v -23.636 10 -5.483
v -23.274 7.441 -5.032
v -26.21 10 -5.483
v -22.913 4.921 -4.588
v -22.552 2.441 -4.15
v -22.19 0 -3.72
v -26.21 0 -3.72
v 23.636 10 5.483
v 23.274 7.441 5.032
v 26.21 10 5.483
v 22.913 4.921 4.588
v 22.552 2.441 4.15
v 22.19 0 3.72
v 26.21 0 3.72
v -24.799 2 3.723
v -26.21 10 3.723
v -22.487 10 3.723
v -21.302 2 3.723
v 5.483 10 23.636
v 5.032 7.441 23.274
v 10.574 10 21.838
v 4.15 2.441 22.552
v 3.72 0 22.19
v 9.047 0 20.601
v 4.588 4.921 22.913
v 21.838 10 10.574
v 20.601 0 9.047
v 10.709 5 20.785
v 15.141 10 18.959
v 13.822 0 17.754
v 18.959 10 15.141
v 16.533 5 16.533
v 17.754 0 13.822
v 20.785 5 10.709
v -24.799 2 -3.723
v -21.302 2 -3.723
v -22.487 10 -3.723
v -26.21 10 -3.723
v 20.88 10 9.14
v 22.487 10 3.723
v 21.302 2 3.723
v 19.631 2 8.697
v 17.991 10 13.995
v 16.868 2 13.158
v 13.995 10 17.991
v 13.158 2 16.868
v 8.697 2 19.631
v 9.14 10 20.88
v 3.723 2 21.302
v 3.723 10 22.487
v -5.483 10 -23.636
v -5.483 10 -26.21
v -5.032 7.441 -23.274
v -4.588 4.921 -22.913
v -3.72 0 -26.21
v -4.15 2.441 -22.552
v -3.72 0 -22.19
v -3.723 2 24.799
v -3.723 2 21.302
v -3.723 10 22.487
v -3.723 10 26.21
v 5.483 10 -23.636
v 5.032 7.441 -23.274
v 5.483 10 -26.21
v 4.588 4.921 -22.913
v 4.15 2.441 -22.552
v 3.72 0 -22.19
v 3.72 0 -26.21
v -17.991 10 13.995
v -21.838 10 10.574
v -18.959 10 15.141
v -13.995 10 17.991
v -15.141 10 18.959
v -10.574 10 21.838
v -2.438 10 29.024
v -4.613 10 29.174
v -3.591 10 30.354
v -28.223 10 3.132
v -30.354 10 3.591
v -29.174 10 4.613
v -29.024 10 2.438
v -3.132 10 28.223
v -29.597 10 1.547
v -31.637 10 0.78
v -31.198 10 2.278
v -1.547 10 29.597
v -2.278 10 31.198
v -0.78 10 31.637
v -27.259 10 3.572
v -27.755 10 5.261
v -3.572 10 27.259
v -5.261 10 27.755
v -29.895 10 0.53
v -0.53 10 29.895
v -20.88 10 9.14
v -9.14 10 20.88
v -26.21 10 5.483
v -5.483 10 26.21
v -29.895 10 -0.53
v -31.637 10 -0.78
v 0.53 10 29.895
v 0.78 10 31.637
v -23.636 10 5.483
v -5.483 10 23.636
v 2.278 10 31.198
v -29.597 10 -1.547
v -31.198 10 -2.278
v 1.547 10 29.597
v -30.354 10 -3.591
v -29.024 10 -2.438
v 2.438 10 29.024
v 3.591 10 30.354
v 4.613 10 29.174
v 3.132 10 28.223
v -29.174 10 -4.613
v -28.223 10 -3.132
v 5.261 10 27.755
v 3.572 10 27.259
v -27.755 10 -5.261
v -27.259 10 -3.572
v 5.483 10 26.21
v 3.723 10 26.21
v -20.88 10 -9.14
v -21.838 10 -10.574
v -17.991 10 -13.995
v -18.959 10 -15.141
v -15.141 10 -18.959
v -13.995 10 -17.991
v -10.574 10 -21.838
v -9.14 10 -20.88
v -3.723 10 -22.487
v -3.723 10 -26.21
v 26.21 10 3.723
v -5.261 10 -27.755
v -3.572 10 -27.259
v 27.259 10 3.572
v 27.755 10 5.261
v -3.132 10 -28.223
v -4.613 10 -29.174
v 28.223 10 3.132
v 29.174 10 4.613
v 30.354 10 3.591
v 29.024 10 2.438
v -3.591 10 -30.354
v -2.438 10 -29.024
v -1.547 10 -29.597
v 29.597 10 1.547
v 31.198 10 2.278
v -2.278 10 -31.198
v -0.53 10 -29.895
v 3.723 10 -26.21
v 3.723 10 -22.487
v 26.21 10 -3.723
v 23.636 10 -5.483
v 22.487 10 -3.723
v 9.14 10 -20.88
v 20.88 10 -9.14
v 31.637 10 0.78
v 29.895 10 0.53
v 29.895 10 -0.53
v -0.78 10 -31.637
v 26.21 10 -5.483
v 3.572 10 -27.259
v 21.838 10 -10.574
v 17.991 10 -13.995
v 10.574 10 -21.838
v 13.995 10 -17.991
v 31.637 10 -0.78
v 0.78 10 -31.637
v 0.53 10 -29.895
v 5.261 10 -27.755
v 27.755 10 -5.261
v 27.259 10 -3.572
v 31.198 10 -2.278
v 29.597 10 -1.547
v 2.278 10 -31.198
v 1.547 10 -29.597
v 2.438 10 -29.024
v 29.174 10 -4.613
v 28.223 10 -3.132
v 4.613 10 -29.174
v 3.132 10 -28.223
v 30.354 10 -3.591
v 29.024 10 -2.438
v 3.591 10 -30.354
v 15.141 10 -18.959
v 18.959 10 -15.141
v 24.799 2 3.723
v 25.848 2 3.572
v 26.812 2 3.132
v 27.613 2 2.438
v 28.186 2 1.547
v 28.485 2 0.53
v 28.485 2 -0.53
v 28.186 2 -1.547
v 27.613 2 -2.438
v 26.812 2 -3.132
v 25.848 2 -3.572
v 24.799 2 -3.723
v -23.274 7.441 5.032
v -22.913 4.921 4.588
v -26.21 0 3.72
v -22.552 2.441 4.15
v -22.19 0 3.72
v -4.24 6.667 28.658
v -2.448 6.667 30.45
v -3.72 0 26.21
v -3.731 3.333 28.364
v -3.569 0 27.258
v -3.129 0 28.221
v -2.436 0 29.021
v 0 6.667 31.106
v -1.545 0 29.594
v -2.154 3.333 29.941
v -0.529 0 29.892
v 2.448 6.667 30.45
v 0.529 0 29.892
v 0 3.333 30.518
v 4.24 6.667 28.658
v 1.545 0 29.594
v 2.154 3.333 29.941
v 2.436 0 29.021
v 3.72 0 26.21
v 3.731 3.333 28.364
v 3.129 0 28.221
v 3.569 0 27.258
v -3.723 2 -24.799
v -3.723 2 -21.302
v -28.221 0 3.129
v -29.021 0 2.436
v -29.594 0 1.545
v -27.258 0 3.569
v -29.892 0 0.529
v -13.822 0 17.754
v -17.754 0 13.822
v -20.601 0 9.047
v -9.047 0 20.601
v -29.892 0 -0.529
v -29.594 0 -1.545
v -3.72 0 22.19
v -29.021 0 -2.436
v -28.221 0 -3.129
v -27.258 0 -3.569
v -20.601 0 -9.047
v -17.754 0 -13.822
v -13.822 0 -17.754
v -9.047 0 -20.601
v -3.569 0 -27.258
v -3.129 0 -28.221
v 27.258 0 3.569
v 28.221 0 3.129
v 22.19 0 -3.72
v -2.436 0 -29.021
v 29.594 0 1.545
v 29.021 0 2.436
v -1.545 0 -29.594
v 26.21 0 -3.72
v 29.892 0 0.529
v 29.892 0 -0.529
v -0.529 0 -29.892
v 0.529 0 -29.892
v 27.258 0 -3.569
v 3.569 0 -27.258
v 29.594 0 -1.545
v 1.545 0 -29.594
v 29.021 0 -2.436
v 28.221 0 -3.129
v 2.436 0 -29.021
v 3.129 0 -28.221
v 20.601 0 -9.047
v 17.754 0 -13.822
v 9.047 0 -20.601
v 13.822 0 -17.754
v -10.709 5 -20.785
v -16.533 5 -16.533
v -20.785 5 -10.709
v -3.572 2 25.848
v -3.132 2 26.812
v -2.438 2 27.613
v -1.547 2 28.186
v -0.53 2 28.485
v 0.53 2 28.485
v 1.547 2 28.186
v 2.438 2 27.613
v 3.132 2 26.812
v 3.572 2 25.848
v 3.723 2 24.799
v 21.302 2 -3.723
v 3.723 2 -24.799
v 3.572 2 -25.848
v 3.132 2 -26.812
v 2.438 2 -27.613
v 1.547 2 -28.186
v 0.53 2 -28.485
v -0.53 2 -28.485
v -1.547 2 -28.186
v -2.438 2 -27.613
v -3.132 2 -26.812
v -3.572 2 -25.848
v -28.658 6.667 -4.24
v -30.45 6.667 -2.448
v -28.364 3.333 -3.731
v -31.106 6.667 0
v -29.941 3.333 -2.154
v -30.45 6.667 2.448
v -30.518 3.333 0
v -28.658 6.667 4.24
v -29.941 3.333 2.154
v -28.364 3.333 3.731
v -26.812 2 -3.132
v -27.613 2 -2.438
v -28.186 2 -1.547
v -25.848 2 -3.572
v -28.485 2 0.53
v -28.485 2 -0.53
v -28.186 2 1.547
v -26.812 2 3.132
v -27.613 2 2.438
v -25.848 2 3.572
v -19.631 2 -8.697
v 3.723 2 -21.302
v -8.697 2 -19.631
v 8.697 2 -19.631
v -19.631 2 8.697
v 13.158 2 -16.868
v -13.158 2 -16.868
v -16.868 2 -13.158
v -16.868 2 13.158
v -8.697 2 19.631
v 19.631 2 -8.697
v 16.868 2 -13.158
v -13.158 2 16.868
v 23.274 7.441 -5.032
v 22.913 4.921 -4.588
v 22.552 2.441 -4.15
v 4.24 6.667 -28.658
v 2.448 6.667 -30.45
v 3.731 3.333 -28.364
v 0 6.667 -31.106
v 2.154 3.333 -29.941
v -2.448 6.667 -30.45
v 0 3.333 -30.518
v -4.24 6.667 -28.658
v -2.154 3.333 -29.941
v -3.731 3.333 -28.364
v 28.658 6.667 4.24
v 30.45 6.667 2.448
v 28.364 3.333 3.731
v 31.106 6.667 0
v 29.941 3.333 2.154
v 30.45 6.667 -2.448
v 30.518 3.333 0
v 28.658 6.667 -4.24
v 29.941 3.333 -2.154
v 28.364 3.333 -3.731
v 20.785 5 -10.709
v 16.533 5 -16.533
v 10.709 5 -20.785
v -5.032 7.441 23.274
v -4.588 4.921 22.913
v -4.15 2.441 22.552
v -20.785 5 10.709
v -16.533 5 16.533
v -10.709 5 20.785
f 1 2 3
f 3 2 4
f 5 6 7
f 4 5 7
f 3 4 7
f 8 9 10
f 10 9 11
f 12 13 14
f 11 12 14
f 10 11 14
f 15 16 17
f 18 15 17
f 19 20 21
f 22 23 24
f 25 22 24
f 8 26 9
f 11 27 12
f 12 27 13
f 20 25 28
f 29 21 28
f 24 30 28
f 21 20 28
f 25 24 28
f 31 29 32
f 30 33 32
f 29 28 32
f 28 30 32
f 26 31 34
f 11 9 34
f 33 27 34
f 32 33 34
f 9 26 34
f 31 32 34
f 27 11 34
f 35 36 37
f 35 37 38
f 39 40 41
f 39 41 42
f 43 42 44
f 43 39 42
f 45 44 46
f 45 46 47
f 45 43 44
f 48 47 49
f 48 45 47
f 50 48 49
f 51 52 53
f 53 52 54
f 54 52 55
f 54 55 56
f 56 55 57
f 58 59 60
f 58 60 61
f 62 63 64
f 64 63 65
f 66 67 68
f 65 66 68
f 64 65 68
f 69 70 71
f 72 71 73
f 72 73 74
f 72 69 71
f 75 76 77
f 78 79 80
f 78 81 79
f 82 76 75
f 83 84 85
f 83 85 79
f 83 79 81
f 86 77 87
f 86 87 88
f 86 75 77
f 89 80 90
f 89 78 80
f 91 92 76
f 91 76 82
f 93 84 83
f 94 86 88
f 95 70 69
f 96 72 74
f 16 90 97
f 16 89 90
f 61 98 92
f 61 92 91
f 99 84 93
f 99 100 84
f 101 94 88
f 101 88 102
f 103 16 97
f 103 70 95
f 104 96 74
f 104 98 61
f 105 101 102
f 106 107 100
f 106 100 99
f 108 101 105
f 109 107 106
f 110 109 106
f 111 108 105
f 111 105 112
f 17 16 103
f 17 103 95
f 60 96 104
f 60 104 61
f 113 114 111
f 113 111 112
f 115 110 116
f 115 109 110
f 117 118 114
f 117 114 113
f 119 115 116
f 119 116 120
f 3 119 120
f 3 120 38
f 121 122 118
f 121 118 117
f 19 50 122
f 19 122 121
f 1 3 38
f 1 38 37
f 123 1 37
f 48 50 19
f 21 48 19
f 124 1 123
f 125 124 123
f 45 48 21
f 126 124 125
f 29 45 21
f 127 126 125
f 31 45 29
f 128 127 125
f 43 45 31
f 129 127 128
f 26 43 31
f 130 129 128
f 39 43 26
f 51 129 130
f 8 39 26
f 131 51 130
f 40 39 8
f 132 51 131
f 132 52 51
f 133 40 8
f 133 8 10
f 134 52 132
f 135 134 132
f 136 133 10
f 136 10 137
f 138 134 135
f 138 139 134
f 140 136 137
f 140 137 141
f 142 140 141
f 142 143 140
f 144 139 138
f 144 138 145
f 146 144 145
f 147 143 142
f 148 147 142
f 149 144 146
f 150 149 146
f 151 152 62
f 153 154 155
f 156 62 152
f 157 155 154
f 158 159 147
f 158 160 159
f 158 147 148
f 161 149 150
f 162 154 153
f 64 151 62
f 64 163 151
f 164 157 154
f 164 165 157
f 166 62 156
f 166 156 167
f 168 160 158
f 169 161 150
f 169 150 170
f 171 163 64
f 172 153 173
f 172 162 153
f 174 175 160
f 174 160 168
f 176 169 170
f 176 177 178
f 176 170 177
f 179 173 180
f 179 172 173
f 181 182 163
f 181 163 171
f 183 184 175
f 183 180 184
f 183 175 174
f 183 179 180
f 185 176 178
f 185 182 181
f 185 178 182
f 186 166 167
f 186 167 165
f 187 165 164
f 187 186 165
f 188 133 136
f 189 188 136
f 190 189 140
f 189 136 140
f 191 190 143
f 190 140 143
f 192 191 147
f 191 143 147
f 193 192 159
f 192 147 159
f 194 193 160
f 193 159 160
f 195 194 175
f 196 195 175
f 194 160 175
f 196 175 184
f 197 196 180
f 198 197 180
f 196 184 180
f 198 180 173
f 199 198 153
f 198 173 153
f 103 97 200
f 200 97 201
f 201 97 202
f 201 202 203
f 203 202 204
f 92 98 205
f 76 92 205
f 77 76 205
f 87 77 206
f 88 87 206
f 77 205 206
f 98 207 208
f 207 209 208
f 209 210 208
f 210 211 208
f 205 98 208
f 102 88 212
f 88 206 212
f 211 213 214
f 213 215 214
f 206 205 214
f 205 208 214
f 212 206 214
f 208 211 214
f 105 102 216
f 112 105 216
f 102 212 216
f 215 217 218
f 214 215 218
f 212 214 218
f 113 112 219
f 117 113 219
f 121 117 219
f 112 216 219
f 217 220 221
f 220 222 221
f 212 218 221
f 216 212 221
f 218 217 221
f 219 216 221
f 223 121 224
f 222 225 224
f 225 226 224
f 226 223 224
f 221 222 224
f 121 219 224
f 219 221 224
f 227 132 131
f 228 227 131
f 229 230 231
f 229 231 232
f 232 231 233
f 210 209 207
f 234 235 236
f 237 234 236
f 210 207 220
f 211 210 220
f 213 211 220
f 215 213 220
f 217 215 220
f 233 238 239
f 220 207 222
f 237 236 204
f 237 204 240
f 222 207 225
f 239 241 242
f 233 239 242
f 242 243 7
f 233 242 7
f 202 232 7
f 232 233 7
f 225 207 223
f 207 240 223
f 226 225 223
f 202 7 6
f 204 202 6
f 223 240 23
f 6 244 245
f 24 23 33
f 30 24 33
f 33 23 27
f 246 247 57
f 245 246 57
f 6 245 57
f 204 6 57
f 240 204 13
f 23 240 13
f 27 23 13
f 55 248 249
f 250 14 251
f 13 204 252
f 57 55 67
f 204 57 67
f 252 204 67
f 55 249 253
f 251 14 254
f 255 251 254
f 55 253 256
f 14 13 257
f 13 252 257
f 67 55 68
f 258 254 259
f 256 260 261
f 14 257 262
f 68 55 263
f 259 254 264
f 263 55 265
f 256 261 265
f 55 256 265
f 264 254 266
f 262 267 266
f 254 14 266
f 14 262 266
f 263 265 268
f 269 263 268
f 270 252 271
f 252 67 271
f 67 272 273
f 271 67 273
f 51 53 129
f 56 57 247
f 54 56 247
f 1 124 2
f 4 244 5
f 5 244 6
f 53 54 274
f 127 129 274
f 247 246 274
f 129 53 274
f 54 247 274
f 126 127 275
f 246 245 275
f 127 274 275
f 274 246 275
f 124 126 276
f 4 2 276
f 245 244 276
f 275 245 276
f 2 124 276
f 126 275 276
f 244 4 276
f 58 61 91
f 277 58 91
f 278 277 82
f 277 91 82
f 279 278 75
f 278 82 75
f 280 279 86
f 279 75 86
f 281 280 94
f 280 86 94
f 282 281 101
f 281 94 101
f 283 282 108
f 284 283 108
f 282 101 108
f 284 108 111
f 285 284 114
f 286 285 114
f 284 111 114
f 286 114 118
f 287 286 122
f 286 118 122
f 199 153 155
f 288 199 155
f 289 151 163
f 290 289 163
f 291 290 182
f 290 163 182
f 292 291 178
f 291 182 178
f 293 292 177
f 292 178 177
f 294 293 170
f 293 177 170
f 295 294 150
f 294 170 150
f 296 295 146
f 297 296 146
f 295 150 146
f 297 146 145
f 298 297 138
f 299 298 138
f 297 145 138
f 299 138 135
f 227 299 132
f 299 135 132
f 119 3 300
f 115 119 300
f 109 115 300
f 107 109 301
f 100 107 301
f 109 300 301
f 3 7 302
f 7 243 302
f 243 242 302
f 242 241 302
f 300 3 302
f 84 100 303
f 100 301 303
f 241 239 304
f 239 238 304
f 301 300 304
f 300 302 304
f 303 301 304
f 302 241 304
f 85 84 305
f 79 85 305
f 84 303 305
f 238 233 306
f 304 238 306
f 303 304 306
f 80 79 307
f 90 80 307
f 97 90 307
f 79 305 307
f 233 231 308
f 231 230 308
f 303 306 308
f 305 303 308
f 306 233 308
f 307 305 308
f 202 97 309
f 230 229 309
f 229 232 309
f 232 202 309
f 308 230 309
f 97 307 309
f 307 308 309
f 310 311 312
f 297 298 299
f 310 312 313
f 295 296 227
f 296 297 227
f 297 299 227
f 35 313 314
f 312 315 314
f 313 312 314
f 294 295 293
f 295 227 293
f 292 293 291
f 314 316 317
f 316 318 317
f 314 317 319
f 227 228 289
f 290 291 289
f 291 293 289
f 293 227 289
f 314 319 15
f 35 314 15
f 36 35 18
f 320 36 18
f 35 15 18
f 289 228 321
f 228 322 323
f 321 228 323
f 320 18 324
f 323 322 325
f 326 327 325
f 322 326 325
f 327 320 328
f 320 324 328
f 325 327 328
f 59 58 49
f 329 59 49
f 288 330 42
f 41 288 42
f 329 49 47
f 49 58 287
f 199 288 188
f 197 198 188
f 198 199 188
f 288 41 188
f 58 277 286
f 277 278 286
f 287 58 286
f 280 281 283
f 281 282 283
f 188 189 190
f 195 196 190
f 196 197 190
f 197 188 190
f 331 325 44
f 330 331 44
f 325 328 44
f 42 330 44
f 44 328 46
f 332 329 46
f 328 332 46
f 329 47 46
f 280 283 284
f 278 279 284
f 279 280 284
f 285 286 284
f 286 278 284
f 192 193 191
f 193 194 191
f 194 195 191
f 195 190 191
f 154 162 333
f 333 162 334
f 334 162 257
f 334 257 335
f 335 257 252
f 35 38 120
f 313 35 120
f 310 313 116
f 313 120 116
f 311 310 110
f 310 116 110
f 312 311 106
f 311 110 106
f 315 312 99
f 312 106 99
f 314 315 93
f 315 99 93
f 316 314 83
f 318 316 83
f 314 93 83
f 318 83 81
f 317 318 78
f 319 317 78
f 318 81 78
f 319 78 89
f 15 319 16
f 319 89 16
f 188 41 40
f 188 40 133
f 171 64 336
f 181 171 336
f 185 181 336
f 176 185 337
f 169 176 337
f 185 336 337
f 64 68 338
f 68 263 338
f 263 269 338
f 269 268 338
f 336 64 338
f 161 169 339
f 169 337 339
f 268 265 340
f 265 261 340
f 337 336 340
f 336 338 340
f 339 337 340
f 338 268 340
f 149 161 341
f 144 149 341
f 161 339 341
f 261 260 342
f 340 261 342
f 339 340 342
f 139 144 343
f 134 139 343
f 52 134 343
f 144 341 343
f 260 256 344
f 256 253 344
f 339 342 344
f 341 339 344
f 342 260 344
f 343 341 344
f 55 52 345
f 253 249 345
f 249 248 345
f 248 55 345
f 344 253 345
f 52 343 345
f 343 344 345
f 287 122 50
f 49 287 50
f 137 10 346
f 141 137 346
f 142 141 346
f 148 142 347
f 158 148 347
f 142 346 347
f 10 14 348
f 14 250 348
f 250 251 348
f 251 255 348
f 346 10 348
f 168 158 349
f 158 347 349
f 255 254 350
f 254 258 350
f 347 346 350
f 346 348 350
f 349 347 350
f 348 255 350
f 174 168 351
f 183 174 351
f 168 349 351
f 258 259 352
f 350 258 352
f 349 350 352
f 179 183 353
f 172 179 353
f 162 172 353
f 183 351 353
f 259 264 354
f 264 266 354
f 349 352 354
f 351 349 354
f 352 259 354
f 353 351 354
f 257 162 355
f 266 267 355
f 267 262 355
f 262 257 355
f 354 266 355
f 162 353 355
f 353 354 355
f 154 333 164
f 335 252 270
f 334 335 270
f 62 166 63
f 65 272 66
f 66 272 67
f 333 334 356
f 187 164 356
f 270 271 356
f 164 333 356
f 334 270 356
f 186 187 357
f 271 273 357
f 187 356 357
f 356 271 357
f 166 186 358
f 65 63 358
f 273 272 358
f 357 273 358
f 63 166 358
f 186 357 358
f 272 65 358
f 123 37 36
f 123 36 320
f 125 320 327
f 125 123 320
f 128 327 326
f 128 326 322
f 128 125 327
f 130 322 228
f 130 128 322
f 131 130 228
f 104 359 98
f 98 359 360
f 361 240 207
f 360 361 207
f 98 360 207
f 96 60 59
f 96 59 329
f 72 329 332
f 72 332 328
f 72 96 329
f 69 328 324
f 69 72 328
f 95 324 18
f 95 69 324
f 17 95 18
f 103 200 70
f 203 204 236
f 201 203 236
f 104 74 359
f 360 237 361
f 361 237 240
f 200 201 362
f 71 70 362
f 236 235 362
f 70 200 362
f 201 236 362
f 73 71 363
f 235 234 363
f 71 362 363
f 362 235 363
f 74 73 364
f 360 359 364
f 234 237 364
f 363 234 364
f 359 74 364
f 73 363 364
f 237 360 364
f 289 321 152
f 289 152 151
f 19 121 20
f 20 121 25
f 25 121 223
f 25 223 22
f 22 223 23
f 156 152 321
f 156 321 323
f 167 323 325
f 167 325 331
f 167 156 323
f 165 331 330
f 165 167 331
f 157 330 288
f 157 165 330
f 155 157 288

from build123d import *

# Parameters (mm, degrees)
EXTRUDE_THIN1_DEPTH = 10
EXTRUDE_THIN1_DRAFT = -10
BOSS_EXTRUDE1_DEPTH = 2
CUT_EXTRUDE1_DEPTH  = 8.123412895
CIRPATTERN1_COUNT   = 4
CUT_EXTRUDE2_DEPTH  = 8.123412895
CIRPATTERN2_COUNT   = 4


with BuildPart() as part:
    # Sketch1 → Extrude-Thin1 (with draft: the straight prism first)
    with BuildSketch(Plane(origin=(0, 0, 0), x_dir=(1, 0, 0), z_dir=(0, 1, 0))):
        with BuildLine():
            ThreePointArc((22.190349254, 3.72), (15.909902577, 15.909902577), (3.72, 22.190349254))
            Line((3.72, 22.190349254), (3.72, 26.21))
            ThreePointArc((3.72, 26.21), (0, 29.93), (-3.72, 26.21))
            Line((-3.72, 26.21), (-3.72, 22.190349254))
            ThreePointArc((-3.72, 22.190349254), (-15.909902577, 15.909902577), (-22.190349254, 3.72))
            Line((-22.190349254, 3.72), (-26.21, 3.72))
            ThreePointArc((-26.21, 3.72), (-29.93, 0), (-26.21, -3.72))
            Line((-26.21, -3.72), (-22.190349254, -3.72))
            ThreePointArc((-22.190349254, -3.72), (-15.909902577, -15.909902577), (-3.72, -22.190349254))
            Line((-3.72, -22.190349254), (-3.72, -26.21))
            ThreePointArc((-3.72, -26.21), (0, -29.93), (3.72, -26.21))
            Line((3.72, -26.21), (3.72, -22.190349254))
            ThreePointArc((3.72, -22.190349254), (15.909902577, -15.909902577), (22.190349254, -3.72))
            Line((22.190349254, -3.72), (26.21, -3.72))
            ThreePointArc((26.21, -3.72), (29.93, 0), (26.21, 3.72))
            Line((26.21, 3.72), (22.190349254, 3.72))
        make_face()
        with BuildLine():
            Line((20.909289801, 2.25), (26.21, 2.25))
            ThreePointArc((26.21, 2.25), (28.46, 0), (26.21, -2.25))
            Line((26.21, -2.25), (20.909289801, -2.25))
            ThreePointArc((20.909289801, -2.25), (14.870455608, -14.870455608), (2.25, -20.909289801))
            Line((2.25, -20.909289801), (2.25, -26.21))
            ThreePointArc((2.25, -26.21), (0, -28.46), (-2.25, -26.21))
            Line((-2.25, -26.21), (-2.25, -20.909289801))
            ThreePointArc((-2.25, -20.909289801), (-14.870455608, -14.870455608), (-20.909289801, -2.25))
            Line((-20.909289801, -2.25), (-26.21, -2.25))
            ThreePointArc((-26.21, -2.25), (-28.46, 0), (-26.21, 2.25))
            Line((-26.21, 2.25), (-20.909289801, 2.25))
            ThreePointArc((-20.909289801, 2.25), (-14.870455608, 14.870455608), (-2.25, 20.909289801))
            Line((-2.25, 20.909289801), (-2.25, 26.21))
            ThreePointArc((-2.25, 26.21), (0, 28.46), (2.25, 26.21))
            Line((2.25, 26.21), (2.25, 20.909289801))
            ThreePointArc((2.25, 20.909289801), (14.870455608, 14.870455608), (20.909289801, 2.25))
        make_face(mode=Mode.SUBTRACT)
    extrude(amount=EXTRUDE_THIN1_DEPTH)
    # Extrude-Thin1: the draft: its side faces are tilted about the plane it starts from
    extrude_thin1_sides = [part.faces().sort_by_distance(p)[0] for p in [
        (-3.72, 5, 24.200174627),
        (0, 5, 29.93),
        (3.72, 5, 24.200174627),
        (15.909902577, 5, 15.909902577),
        (24.200174627, 5, 3.72),
        (29.93, 5, 0),
        (24.200174627, 5, -3.72),
        (15.909902577, 5, -15.909902577),
        (3.72, 5, -24.200174627),
        (0, 5, -29.93),
        (-3.72, 5, -24.200174627),
        (-15.909902577, 5, -15.909902577),
        (-24.200174627, 5, -3.72),
        (-29.93, 5, 0),
        (-24.200174627, 5, 3.72),
        (-15.909902577, 5, 15.909902577),
        (-23.559644901, 5, 2.25),
        (-28.46, 5, 0),
        (-23.559644901, 5, -2.25),
        (-14.870455608, 5, -14.870455608),
        (-2.25, 5, -23.559644901),
        (0, 5, -28.46),
        (2.25, 5, -23.559644901),
        (14.870455608, 5, -14.870455608),
        (23.559644901, 5, -2.25),
        (28.46, 5, 0),
        (23.559644901, 5, 2.25),
        (14.870455608, 5, 14.870455608),
        (2.25, 5, 23.559644901),
        (0, 5, 28.46),
        (-2.25, 5, 23.559644901),
        (-14.870455608, 5, 14.870455608),
    ]]
    draft(extrude_thin1_sides, Plane(origin=(0, 0, 0), x_dir=(1, 0, 0), z_dir=(0, 1, 0)), EXTRUDE_THIN1_DRAFT)

    # Sketch2 → Boss-Extrude1 (add)
    with BuildSketch(Plane.XZ):
        with BuildLine():
            Line((3.72, -26.21), (3.72, -22.190349254))
            ThreePointArc((3.72, -22.190349254), (15.909902577, -15.909902577), (22.190349254, -3.72))
            Line((22.190349254, -3.72), (26.21, -3.72))
            ThreePointArc((26.21, -3.72), (29.93, 0), (26.21, 3.72))
            Line((26.21, 3.72), (22.190349254, 3.72))
            ThreePointArc((22.190349254, 3.72), (15.909902577, 15.909902577), (3.72, 22.190349254))
            Line((3.72, 22.190349254), (3.72, 26.21))
            ThreePointArc((3.72, 26.21), (0, 29.93), (-3.72, 26.21))
            Line((-3.72, 26.21), (-3.72, 22.190349254))
            ThreePointArc((-3.72, 22.190349254), (-15.909902577, 15.909902577), (-22.190349254, 3.72))
            Line((-22.190349254, 3.72), (-26.21, 3.72))
            ThreePointArc((-26.21, 3.72), (-29.93, 0), (-26.21, -3.72))
            Line((-26.21, -3.72), (-22.190349254, -3.72))
            ThreePointArc((-22.190349254, -3.72), (-15.909902577, -15.909902577), (-3.72, -22.190349254))
            Line((-3.72, -22.190349254), (-3.72, -26.21))
            ThreePointArc((-3.72, -26.21), (0, -29.93), (3.72, -26.21))
        make_face()
    extrude(amount=-BOSS_EXTRUDE1_DEPTH)

    # Sketch4 → Cut-Extrude1 (cut, along a direction that is not the sketch's normal)
    with BuildSketch(Plane(origin=(0, 10, 0), x_dir=(1, 0, 0), z_dir=(0, 1, 0))):
        with BuildLine():
            Line((26.21, 3.723269807), (18.903548722, 3.723269807))
            ThreePointArc((18.903548722, 3.723269807), (19.266730193, 0), (18.903548722, -3.723269807))
            Line((18.903548722, -3.723269807), (26.21, -3.723269807))
            ThreePointArc((26.21, -3.723269807), (29.933269807, 0), (26.21, 3.723269807))
        make_face()
    cut_extrude1 = extrude(amount=-CUT_EXTRUDE1_DEPTH, dir=(0.17364817766693075, 0.984807753012208, 0), mode=Mode.SUBTRACT)

    # CirPattern1: Cut-Extrude1 ×4 about axis
    cirpattern1_axis = Axis((0, 0, 0), (0, -1, 0))
    for i in range(1, CIRPATTERN1_COUNT):
        add(cut_extrude1.rotate(cirpattern1_axis, i * 360 / CIRPATTERN1_COUNT), mode=Mode.SUBTRACT)

    # Sketch7 → Cut-Extrude2 (cut, along a direction that is not the sketch's normal)
    with BuildSketch(Plane(origin=(0, 10, 0), x_dir=(1, 0, 0), z_dir=(0, 1, 0))):
        with BuildLine():
            Line((3.723269807, 18.903548722), (3.723269807, 22.487116544))
            ThreePointArc((3.723269807, 22.487116544), (16.117275646, 16.117275646), (22.487116544, 3.723269807))
            Line((22.487116544, 3.723269807), (18.903548722, 3.723269807))
            ThreePointArc((18.903548722, 3.723269807), (13.623635571, 13.623635571), (3.723269807, 18.903548722))
        make_face()
    cut_extrude2 = extrude(amount=-CUT_EXTRUDE2_DEPTH, dir=(0.12278780396897289, 0.9848077530122081, -0.12278780396897289), mode=Mode.SUBTRACT)

    # CirPattern2: Cut-Extrude2 ×4 about axis
    cirpattern2_axis = Axis((0, 0, 0), (0, -1, 0))
    for i in range(1, CIRPATTERN2_COUNT):
        add(cut_extrude2.rotate(cirpattern2_axis, i * 360 / CIRPATTERN2_COUNT), mode=Mode.SUBTRACT)


solid = part.part
